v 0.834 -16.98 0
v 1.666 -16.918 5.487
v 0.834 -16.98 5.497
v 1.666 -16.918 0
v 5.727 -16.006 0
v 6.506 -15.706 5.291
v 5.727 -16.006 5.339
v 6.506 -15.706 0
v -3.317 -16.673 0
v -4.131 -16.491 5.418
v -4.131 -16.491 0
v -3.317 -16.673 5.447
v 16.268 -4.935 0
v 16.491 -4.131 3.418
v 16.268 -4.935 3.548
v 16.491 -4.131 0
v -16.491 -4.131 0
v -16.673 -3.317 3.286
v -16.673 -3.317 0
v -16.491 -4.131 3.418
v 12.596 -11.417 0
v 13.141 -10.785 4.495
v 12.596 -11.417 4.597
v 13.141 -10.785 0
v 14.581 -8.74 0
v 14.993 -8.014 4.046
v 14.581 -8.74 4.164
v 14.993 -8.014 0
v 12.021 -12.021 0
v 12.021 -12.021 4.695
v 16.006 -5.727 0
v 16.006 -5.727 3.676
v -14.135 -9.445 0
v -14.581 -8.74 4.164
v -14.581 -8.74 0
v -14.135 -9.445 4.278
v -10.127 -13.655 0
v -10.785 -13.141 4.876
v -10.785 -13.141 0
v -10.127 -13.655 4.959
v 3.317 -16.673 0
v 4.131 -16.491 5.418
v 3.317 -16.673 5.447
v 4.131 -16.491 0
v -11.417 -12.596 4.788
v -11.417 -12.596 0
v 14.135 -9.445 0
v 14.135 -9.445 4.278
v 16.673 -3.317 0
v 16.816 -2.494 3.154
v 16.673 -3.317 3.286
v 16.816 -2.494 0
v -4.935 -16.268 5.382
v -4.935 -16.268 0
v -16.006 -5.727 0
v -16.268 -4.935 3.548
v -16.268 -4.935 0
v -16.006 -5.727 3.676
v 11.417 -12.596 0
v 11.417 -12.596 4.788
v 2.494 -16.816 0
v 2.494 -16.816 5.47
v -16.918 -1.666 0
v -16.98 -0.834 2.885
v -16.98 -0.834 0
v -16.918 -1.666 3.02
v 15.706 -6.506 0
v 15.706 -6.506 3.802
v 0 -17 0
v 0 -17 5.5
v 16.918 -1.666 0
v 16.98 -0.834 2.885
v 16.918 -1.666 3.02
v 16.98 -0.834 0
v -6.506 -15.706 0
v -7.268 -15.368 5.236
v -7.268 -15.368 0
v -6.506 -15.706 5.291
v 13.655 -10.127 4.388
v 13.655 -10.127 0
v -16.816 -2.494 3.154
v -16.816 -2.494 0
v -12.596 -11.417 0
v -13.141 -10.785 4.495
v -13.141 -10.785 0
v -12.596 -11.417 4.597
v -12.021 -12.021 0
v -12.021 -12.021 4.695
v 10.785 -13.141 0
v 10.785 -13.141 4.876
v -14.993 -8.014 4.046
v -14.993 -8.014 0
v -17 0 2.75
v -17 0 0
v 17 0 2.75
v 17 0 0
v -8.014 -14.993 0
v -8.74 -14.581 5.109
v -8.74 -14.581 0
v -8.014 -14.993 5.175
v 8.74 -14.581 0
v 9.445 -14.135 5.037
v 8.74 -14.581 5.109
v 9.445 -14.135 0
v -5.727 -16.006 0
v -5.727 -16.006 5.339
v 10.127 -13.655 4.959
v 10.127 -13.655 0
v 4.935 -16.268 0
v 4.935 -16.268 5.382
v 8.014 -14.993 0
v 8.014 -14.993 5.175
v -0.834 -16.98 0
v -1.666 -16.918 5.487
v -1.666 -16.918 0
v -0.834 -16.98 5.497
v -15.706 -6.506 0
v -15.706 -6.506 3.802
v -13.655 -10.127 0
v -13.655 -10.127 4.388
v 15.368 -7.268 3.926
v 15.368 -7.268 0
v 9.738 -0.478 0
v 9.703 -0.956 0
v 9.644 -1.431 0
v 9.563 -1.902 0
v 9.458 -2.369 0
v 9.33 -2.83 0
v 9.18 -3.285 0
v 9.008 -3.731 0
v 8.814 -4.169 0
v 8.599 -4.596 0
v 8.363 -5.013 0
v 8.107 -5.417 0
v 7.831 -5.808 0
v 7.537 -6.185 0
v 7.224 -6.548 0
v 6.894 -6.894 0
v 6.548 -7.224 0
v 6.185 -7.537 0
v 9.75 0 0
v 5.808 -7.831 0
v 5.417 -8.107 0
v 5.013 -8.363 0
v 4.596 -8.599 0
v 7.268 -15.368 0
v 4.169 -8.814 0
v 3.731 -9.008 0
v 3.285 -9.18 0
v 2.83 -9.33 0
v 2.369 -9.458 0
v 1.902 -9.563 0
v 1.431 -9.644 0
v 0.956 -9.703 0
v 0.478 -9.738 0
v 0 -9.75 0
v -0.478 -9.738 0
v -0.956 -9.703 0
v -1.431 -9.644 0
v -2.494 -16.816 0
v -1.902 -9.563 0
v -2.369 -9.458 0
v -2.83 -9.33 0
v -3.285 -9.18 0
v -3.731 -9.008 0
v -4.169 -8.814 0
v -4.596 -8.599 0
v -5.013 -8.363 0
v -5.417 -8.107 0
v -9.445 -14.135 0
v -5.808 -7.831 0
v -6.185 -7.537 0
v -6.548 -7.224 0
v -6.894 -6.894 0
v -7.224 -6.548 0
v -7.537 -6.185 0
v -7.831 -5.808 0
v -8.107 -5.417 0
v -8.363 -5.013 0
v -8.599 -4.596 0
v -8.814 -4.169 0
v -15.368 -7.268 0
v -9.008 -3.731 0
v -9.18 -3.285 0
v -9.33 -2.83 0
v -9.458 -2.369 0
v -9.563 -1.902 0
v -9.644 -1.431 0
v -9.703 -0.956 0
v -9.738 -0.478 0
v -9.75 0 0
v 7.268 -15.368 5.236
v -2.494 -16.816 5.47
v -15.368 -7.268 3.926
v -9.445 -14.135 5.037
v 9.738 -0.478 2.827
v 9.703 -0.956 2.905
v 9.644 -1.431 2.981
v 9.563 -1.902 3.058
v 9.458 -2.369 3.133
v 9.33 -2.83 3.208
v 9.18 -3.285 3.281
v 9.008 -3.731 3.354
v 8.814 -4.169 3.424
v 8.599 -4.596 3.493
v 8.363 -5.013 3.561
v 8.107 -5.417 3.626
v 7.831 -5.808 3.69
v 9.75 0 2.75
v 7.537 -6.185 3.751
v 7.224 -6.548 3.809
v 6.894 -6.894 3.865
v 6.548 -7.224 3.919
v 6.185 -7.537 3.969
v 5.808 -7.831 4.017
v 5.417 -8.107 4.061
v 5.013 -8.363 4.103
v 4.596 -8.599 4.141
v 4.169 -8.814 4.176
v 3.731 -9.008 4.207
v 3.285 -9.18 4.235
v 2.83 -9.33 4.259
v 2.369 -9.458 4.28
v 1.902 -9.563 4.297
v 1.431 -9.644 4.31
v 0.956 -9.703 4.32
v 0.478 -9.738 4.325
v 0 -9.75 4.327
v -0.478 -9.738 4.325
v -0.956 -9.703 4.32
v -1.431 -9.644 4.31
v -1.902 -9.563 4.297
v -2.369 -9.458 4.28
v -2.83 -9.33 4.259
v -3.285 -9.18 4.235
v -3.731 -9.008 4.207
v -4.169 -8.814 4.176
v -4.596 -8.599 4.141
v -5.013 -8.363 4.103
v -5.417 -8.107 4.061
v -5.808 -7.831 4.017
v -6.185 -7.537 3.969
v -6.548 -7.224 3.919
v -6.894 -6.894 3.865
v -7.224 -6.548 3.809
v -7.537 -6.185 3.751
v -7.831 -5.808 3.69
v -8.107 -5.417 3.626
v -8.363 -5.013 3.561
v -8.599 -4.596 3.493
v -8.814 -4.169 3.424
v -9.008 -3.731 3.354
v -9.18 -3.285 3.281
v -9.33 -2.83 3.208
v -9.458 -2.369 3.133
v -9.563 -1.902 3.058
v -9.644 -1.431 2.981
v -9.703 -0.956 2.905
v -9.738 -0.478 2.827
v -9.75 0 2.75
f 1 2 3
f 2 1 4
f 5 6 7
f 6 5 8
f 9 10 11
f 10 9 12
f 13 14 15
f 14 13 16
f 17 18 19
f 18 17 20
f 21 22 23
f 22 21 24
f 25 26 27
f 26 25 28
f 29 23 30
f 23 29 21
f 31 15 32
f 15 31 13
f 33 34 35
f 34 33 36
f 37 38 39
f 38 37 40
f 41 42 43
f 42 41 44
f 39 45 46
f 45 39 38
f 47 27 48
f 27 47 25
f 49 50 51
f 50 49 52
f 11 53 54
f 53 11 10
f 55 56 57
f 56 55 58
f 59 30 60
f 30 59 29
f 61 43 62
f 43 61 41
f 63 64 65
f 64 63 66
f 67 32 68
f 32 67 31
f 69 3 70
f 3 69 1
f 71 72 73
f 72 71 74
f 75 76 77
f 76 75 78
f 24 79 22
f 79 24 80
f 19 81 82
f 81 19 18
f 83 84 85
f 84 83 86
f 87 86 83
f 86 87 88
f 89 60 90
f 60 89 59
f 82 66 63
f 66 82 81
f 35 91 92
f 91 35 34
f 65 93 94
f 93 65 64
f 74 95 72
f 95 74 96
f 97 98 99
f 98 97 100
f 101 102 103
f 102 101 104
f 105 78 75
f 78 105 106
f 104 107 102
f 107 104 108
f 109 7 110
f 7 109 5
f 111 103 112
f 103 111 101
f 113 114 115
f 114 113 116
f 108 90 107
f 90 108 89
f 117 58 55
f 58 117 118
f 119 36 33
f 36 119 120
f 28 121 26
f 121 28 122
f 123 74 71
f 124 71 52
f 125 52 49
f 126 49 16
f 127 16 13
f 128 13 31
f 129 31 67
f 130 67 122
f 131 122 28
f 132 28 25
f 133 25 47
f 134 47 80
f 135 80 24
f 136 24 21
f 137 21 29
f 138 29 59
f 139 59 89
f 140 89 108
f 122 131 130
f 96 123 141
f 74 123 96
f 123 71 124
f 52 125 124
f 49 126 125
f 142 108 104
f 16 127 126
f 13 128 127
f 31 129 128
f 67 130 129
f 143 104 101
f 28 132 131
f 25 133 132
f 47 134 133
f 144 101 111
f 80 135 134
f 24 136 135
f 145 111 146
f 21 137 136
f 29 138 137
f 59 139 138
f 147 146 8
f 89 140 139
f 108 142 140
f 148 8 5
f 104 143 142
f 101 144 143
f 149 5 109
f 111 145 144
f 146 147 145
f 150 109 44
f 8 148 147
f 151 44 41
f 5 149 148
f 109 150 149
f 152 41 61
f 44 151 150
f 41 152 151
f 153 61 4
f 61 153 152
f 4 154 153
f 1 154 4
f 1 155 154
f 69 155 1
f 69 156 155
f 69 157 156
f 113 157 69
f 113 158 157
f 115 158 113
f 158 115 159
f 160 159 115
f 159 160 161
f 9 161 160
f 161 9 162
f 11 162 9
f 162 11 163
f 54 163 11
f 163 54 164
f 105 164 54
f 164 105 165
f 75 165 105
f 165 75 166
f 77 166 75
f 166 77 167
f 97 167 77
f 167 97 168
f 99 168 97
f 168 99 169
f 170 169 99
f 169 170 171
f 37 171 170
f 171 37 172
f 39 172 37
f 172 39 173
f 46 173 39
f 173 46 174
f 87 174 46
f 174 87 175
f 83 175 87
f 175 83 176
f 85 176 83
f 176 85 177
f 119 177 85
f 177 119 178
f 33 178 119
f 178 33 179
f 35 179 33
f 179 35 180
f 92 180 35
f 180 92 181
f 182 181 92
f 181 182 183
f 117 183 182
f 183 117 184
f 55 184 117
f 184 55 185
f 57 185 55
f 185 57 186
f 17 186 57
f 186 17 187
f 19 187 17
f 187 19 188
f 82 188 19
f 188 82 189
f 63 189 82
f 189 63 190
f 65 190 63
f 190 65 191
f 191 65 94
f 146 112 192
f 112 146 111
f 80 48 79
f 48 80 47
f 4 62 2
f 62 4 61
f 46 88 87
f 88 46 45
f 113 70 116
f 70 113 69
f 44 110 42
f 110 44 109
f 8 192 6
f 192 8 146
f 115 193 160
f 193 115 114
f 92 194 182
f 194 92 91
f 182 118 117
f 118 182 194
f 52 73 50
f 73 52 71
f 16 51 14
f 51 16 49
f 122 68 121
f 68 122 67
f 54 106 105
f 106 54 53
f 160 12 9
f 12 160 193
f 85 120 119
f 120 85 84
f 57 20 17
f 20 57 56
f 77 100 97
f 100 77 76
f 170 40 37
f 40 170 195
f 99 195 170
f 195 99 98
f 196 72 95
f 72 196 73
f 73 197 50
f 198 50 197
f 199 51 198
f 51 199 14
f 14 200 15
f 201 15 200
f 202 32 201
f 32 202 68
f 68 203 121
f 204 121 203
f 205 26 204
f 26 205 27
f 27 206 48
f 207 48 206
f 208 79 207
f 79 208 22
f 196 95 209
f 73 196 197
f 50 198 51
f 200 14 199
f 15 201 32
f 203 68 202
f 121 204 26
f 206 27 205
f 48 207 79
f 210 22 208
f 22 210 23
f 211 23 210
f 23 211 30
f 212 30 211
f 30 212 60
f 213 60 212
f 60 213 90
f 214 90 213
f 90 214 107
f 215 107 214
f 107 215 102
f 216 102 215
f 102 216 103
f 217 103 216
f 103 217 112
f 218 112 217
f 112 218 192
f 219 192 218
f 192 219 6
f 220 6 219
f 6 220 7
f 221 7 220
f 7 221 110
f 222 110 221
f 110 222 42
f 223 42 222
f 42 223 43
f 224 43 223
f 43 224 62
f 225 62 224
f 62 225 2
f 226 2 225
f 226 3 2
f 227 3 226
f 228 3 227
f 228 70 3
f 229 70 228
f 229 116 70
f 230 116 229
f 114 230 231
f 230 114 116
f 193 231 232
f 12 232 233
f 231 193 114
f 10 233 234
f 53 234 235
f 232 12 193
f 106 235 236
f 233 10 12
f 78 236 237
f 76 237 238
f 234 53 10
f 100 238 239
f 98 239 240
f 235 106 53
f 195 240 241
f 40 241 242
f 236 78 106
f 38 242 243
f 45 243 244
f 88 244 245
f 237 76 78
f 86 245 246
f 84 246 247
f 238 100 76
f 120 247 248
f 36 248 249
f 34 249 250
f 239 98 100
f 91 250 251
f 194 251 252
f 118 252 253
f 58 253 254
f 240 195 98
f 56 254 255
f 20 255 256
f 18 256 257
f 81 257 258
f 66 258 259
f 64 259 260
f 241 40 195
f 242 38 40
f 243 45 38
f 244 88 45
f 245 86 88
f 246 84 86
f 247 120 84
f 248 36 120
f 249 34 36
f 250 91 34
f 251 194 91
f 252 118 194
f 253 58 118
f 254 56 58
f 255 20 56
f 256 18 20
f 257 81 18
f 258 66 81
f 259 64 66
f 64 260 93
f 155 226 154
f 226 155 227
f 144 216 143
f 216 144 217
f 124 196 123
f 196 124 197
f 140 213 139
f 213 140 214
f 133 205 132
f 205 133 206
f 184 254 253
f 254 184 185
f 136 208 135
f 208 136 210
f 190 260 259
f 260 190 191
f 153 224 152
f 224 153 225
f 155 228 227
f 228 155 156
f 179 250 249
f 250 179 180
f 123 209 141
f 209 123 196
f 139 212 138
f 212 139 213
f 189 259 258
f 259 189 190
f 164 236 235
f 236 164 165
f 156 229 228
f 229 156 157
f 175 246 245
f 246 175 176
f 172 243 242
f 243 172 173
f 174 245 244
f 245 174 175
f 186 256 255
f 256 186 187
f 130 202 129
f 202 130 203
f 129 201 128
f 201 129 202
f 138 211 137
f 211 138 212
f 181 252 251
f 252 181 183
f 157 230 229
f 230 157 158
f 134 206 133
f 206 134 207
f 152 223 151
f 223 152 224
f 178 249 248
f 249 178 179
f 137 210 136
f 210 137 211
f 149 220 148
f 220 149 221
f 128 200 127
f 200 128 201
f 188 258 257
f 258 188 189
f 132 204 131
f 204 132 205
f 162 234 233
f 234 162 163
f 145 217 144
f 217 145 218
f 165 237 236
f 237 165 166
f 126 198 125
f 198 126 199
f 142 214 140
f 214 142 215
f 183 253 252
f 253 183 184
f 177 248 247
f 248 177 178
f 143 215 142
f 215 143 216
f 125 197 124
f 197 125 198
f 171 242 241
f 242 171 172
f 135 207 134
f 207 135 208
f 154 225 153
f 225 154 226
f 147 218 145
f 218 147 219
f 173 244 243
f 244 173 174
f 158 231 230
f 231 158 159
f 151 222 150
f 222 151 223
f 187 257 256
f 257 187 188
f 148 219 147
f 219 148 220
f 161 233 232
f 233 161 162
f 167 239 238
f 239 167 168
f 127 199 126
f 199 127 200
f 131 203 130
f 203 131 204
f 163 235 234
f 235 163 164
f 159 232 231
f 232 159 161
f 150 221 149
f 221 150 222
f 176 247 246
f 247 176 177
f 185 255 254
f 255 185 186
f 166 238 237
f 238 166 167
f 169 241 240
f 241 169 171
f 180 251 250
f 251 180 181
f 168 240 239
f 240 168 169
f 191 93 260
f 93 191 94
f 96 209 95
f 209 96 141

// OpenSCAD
// file: common.scad
module ccube(dims) {
    translate([-dims[0]/2, -dims[1]/2, 0]) cube(dims);
}
// main file
include <common.scad>

inner = 19.5;
outer = 34;
// gap = 11;
gap = outer;
dz = 5.5;
thickness = 0;

$fn = 128;


module slopeWedge() {
  translate([outer/2, -outer/2, 0])
  rotate([0, -90, 0])
  linear_extrude(outer)
    polygon([
      [dz,       0],
      [dz, outer],
      [      0, outer],
    ]);
}


difference() {
  cylinder(d=outer, h=thickness+dz);
  translate([0, 0, thickness])
    slopeWedge();
  cylinder(d=inner, h=thickness+dz);
  translate([-gap/2, 0, 0]) cube([gap, outer/2, dz+thickness]);
}
